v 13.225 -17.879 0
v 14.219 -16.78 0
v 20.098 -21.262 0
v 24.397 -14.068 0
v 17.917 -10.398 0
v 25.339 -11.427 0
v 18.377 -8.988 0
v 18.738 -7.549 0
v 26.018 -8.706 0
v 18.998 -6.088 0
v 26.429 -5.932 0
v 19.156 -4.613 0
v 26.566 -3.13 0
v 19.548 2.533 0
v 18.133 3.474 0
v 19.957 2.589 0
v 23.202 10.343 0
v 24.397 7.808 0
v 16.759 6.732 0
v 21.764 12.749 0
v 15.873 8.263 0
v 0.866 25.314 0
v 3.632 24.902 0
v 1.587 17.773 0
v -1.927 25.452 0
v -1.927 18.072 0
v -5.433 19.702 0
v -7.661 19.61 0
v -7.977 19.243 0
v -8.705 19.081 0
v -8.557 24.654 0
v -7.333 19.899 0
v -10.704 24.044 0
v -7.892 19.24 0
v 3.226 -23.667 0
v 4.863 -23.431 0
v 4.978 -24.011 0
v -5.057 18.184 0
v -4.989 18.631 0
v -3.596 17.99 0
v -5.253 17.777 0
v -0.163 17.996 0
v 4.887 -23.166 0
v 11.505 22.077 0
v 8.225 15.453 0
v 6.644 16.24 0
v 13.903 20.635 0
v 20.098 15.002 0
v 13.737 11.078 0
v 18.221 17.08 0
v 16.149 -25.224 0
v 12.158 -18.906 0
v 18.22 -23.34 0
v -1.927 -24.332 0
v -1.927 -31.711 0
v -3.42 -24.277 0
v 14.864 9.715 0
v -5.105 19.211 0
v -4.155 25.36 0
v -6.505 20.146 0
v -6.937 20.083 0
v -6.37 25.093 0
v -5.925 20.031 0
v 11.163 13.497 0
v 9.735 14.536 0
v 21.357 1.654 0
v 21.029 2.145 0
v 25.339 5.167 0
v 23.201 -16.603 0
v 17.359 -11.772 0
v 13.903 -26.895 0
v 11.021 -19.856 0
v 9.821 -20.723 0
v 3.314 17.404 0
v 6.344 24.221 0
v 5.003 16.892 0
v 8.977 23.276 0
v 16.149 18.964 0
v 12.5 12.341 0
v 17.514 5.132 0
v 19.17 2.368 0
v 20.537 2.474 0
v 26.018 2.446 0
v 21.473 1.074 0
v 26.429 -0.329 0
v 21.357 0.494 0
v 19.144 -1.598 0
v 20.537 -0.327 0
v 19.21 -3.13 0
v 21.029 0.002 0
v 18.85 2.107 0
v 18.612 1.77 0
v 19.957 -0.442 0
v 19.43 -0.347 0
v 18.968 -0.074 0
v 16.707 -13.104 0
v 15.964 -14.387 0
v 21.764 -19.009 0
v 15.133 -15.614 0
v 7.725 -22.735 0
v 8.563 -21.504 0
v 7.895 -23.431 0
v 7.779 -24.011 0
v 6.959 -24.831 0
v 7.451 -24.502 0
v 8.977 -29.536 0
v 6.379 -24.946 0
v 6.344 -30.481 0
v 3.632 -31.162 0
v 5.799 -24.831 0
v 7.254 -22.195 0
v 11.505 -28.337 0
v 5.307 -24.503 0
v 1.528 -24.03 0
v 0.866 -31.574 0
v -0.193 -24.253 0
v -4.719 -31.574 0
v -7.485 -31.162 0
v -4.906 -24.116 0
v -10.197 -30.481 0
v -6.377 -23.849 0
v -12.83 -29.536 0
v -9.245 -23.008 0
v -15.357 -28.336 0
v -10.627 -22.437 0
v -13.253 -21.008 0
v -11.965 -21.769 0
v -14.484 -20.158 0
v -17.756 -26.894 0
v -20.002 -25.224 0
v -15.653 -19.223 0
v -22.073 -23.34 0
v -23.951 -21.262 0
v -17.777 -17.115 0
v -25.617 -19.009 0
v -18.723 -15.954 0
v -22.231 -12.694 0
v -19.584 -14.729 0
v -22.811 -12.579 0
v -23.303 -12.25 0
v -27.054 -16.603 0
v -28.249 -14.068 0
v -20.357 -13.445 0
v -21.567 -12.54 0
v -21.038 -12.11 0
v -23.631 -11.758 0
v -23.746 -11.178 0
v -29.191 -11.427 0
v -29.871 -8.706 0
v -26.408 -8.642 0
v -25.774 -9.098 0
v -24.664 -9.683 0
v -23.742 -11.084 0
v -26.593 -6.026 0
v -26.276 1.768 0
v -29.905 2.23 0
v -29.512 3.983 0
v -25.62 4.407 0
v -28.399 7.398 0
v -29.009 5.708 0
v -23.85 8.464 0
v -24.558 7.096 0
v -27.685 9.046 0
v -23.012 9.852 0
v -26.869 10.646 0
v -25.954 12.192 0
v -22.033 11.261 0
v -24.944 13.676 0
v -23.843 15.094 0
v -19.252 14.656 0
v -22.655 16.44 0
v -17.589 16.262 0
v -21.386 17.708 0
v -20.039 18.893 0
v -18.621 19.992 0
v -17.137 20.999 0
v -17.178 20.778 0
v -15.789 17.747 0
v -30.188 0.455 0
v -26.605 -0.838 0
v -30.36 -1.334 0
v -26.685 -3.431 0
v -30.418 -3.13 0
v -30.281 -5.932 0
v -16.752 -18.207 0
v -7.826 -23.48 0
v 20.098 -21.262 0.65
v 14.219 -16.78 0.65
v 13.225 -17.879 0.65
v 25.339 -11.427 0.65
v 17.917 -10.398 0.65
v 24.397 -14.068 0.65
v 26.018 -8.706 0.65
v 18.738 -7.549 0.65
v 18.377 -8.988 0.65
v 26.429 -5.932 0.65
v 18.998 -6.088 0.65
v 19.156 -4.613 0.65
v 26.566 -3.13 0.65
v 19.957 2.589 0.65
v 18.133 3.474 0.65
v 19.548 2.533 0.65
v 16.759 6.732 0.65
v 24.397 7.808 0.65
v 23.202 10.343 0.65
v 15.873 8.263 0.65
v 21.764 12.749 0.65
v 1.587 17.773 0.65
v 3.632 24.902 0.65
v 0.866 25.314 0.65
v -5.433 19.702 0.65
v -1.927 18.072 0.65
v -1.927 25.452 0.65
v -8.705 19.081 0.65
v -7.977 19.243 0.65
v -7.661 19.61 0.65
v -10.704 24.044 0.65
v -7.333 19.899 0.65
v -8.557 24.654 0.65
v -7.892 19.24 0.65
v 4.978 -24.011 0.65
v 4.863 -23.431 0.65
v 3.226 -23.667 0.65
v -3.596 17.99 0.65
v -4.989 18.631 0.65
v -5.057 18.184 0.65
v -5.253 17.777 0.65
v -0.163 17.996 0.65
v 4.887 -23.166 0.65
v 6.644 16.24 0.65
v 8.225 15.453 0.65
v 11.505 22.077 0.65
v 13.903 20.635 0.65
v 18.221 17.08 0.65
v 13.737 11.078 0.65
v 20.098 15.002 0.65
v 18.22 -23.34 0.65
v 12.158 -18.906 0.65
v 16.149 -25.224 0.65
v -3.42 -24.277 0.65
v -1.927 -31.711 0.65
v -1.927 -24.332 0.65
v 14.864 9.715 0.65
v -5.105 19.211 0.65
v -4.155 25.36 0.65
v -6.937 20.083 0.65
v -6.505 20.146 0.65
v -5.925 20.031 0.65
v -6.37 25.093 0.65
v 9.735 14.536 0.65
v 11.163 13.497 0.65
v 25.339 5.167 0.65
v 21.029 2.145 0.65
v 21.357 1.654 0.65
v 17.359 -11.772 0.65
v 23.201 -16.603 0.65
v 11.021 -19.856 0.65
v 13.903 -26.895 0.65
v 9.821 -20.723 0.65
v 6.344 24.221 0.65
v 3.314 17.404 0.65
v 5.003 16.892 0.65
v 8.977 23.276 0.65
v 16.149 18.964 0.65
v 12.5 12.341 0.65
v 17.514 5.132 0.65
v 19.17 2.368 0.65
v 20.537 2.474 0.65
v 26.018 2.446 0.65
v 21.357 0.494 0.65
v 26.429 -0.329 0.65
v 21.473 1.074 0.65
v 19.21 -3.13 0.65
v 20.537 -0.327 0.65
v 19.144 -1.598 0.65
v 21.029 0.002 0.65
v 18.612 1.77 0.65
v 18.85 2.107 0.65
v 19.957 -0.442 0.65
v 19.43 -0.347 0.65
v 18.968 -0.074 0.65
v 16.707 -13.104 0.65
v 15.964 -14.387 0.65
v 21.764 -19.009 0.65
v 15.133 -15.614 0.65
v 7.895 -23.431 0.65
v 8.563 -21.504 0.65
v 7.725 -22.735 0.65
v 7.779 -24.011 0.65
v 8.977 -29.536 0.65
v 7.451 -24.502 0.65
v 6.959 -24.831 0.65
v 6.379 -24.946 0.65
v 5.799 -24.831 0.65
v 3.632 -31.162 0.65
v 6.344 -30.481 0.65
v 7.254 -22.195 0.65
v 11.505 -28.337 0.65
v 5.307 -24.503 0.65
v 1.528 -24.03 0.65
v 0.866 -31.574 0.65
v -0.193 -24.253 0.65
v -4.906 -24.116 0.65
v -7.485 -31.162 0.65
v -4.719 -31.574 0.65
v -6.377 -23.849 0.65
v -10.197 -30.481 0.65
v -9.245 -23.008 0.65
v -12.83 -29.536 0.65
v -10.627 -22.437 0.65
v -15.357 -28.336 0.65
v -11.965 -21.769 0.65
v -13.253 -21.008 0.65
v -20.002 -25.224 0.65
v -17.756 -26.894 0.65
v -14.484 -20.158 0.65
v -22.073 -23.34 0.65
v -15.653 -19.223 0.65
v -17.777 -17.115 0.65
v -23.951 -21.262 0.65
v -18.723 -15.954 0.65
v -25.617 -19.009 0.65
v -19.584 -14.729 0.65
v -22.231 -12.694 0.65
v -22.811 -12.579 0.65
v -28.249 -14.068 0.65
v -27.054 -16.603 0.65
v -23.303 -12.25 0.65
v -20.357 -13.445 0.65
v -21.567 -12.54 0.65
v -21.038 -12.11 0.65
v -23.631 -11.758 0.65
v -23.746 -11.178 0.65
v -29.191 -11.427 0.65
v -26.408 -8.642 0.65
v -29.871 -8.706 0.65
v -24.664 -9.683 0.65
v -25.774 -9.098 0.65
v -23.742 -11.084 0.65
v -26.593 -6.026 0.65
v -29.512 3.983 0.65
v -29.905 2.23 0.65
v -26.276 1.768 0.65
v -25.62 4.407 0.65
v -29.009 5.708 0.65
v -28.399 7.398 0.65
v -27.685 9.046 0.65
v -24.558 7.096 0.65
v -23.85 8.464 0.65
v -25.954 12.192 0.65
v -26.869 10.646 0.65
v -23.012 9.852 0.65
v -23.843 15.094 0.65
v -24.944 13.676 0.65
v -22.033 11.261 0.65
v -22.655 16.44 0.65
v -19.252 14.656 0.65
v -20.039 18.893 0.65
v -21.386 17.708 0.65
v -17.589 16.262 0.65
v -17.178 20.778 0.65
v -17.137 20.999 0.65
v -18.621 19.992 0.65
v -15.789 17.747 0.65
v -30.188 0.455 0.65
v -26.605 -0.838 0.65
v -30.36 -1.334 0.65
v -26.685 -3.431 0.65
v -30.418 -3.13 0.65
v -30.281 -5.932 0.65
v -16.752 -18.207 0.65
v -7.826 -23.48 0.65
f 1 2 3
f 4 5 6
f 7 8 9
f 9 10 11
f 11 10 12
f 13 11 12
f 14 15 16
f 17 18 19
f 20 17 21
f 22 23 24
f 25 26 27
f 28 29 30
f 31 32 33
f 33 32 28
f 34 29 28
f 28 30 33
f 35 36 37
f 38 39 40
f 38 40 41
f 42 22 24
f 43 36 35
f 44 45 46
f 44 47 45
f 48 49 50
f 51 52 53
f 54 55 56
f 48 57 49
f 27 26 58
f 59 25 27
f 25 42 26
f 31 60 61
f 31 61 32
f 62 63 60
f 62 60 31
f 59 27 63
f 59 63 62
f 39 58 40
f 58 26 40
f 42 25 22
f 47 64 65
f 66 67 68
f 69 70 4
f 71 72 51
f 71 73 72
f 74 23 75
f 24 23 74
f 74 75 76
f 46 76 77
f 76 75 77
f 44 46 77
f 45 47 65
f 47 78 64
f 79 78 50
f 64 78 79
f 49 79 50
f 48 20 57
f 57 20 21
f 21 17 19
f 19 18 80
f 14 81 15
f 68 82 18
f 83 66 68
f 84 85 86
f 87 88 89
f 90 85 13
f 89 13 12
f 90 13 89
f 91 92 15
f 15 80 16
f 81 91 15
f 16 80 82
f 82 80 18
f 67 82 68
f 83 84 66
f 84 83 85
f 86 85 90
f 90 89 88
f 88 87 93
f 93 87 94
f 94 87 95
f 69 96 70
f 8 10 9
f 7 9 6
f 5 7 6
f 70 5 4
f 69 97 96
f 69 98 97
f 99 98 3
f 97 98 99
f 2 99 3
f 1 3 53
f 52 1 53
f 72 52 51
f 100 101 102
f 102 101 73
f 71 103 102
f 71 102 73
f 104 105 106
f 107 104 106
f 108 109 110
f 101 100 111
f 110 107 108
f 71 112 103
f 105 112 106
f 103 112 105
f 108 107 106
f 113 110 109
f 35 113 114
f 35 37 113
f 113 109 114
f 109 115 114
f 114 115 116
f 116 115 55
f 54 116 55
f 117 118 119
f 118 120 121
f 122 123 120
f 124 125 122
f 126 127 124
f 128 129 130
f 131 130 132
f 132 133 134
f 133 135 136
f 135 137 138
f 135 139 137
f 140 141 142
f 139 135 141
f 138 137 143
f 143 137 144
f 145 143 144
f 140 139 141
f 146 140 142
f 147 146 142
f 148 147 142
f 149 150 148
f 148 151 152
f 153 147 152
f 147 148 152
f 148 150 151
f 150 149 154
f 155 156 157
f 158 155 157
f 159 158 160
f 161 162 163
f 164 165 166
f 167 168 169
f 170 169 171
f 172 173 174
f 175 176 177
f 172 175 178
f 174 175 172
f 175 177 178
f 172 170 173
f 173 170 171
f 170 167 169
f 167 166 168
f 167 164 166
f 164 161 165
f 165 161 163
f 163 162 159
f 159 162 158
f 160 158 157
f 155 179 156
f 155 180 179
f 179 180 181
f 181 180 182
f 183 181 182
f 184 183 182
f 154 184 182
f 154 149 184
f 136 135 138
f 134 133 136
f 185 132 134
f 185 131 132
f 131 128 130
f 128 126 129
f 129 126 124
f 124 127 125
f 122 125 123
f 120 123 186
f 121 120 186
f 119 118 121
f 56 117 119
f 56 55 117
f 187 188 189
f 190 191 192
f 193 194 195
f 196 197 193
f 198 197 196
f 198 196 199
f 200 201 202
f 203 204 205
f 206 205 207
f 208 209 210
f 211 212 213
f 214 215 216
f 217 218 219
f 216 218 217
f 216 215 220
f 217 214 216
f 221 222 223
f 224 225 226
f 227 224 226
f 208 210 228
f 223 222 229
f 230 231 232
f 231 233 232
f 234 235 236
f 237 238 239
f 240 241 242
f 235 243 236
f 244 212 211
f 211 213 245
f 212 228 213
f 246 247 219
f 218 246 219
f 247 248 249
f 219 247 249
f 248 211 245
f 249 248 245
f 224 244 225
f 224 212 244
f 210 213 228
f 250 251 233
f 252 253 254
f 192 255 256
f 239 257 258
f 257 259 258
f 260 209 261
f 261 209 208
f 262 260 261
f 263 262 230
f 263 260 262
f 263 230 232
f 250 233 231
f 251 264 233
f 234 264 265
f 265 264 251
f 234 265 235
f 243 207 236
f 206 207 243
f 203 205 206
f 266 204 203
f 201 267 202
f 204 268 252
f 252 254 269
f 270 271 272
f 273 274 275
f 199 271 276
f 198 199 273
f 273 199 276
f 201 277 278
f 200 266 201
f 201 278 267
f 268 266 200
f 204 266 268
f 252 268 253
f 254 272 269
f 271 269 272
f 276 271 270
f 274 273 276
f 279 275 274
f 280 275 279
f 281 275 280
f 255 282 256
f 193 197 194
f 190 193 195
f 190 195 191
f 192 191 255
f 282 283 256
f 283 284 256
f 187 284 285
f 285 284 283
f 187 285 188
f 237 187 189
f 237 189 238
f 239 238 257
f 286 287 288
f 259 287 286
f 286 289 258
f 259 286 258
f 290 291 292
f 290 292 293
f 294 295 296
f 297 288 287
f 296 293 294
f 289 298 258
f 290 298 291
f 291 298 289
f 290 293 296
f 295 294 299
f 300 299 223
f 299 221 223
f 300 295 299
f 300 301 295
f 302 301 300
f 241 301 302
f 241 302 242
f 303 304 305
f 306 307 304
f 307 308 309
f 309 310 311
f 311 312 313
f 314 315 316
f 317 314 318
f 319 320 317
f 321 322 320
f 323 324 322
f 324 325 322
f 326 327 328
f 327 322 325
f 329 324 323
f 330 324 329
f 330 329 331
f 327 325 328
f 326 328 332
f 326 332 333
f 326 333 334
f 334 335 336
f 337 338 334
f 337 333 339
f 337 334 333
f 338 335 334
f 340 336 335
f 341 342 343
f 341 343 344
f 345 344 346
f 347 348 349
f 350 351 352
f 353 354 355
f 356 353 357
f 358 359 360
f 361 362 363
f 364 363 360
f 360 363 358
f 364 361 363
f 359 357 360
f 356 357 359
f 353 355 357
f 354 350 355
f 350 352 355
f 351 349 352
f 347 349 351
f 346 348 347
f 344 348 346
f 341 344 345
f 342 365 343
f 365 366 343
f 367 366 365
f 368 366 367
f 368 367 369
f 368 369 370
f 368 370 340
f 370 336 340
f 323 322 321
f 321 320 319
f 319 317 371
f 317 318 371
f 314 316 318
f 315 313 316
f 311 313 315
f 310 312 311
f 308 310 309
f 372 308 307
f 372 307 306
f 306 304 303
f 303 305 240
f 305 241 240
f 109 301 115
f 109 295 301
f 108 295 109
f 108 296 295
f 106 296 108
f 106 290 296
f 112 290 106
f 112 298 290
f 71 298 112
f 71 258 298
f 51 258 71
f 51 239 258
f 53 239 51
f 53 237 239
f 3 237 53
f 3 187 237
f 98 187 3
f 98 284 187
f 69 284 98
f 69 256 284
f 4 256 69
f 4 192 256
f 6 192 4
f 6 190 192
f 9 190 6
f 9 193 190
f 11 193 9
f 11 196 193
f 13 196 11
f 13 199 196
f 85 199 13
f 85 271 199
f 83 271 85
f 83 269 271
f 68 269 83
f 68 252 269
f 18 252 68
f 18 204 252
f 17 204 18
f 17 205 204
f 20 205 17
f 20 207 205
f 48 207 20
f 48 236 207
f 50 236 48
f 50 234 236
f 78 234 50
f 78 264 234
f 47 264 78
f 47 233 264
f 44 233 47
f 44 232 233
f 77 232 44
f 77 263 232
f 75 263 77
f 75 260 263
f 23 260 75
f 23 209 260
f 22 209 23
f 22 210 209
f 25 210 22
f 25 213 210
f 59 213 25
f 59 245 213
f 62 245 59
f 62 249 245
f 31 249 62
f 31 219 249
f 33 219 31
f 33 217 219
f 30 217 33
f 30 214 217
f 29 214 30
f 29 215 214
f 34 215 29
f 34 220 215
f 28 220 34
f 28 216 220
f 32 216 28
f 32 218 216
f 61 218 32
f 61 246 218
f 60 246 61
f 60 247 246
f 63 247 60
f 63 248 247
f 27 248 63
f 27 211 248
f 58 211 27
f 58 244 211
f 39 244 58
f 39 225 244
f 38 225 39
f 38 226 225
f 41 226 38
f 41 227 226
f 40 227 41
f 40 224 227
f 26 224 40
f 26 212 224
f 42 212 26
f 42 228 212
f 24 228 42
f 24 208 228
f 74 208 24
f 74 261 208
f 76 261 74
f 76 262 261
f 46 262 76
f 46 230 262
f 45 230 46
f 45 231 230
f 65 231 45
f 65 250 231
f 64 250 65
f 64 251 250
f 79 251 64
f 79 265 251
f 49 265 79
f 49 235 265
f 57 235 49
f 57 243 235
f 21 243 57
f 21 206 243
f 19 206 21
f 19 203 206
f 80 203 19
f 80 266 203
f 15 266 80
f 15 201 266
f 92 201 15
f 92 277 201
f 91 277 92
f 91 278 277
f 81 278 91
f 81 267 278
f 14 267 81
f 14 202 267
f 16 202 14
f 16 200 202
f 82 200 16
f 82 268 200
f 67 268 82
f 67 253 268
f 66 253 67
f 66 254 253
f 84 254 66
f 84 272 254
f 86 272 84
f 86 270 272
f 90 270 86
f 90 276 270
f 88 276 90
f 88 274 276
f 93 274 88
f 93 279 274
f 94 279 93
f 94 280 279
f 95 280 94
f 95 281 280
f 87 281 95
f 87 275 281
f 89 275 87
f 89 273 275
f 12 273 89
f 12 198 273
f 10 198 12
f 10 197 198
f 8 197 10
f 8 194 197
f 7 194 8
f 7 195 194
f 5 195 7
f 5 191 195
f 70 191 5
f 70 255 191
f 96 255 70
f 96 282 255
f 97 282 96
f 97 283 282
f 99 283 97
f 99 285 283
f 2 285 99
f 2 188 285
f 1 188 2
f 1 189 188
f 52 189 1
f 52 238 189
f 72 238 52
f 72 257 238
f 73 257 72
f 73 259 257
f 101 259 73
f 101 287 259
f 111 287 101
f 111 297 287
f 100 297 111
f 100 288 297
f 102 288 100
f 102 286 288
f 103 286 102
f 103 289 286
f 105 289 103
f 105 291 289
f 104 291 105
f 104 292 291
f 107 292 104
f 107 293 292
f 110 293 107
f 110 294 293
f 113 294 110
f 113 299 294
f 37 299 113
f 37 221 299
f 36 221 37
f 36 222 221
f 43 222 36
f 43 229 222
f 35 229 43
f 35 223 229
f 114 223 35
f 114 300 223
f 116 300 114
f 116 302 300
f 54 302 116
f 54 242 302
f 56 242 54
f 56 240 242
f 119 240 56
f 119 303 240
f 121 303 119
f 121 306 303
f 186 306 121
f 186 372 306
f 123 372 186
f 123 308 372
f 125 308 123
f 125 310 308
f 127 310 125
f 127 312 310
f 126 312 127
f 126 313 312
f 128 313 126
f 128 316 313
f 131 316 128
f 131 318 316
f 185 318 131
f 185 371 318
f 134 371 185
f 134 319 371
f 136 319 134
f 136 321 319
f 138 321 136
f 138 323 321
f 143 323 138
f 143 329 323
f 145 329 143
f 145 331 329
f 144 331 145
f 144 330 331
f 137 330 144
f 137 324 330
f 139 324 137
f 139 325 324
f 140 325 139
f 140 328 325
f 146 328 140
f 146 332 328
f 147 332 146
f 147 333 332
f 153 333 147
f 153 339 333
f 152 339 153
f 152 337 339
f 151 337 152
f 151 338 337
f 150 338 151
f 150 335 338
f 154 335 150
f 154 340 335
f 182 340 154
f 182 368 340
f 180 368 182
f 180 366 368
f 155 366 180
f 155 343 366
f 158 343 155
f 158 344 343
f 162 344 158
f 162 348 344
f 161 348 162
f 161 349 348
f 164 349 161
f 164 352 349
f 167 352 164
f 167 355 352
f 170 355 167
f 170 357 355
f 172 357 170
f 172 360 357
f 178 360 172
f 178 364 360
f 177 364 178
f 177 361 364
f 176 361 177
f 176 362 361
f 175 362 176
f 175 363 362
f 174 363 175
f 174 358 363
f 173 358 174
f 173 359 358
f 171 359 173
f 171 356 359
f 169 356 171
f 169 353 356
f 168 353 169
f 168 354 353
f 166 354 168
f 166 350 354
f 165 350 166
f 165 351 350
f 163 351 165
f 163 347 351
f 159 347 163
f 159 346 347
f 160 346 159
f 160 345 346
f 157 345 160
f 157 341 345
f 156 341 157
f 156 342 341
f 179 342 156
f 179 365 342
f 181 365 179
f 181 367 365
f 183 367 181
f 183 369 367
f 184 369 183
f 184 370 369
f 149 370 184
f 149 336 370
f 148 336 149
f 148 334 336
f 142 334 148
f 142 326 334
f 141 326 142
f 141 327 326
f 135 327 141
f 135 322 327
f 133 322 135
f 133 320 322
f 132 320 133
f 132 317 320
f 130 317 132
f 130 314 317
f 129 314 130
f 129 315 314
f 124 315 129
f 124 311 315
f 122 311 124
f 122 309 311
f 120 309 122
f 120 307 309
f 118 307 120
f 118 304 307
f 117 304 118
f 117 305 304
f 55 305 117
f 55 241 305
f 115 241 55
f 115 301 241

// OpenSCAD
height_ship = 0.65;

center_ship_1 = [-1.926290986,-3.129920167];
size_ship_1 = [56.984115807,57.162917324];
stroke_width_ship_1 = 0.263352320;
// paths for ship_1
points_ship_1_1 = [ [-0.000259292,28.581458662],[-2.229081249,28.489718778],[-4.443917753,28.223348693],[-6.631192720,27.783981150],[-8.777499009,27.174309302],[-6.778656628,22.210787020],[-6.051052474,22.373053326],[-5.965785205,22.369433827],[-5.734531606,22.739999746],[-5.407204891,23.029230714],[-5.010989030,23.213106554],[-4.578789126,23.276356665],[-3.998776227,23.160967826],[-3.507065558,22.832410129],[-3.178508712,22.340698897],[-3.063120882,21.760685809],[-3.130488922,21.313709606],[-3.326669690,20.906475906],[-1.669293112,21.120274157],[-0.000259292,21.202063102],[1.762986824,21.126052251],[3.513764304,20.902741144],[5.239866050,20.533686790],[6.929257012,20.021462381],[8.570158102,19.369639342],[10.151128324,18.582762438],[11.661144539,17.666318077],[13.089678331,16.626696066],[14.426769409,15.471145051],[15.663095056,14.207721981],[16.790035130,12.845235932],[17.799732170,11.393186683],[18.685146177,9.861698484],[19.440103701,8.261449464],[20.059340886,6.603597178],[20.538540172,4.899700815],[20.776208444,5.237062548],[21.096063470,5.497815134],[21.474395622,5.662629979],[21.883160585,5.719289991],[22.463173484,5.603901151],[22.954884153,5.275343454],[23.283440999,4.783632222],[23.398828828,4.203619134],[23.283440999,3.623606047],[22.954884153,3.131894815],[22.463173484,2.803337118],[21.883160585,2.687948278],[21.355836107,2.783147757],[20.894589957,3.055885784],[21.070391508,1.532195153],[21.135919057,-0.000257969],[21.081848921,-1.482990197],[20.924537848,-2.958298516],[20.664756212,-4.418958141],[20.303776199,-5.857816026],[19.843365576,-7.267825888],[19.285779036,-8.642082720],[18.633747156,-9.973856600],[17.890463024,-11.256625651],[17.059566603,-12.484107981],[16.145126904,-13.650292443],[15.151622063,-14.749468073],[14.083917406,-15.776252061],[12.947241627,-16.725616107],[11.747161182,-17.592911048],[10.489553025,-18.373889621],[9.180575835,-19.064727271],[9.651011404,-19.604924644],[9.820846323,-20.300826159],[9.705458493,-20.880839246],[9.376901648,-21.372550479],[8.885190978,-21.701108176],[8.305178080,-21.816497015],[7.725005929,-21.701257039],[7.233119266,-21.372733855],[6.904428683,-20.880959042],[6.788991253,-20.300826159],[6.813795940,-20.035726899],[5.151931098,-20.537338513],[3.454644645,-20.900492096],[1.733379616,-21.122739280],[-0.000259292,-21.202581686],[-1.493968051,-21.147042644],[-2.980028583,-20.985742790],[-4.451008659,-20.719488830],[-5.899551476,-20.349612380],[-7.318412443,-19.877963300],[-8.700495419,-19.306900447],[-10.038888199,-18.639279874],[-11.326897088,-17.878440549],[-12.558080372,-17.028187652],[-13.726280542,-16.092773550],[-14.825655083,-15.076876524],[-15.850705701,-13.985577375],[-16.796305815,-12.824334010],[-17.657726200,-11.598954151],[-18.430658639,-10.315566283],[-19.111237468,-8.980589006],[-19.640460540,-9.410243557],[-20.304444780,-9.564532337],[-20.884577676,-9.449094910],[-21.376352499,-9.120404334],[-21.704875691,-8.628517681],[-21.820115669,-8.048345544],[-21.815464295,-7.953778172],[-22.737370507,-6.553346582],[-23.848182602,-5.968467288],[-24.481450892,-5.512584270],[-24.481450892,-5.512584270],[-24.666637301,-2.896028690],[-24.758557033,-0.300607293],[-24.679110731,2.291465534],[-24.350199041,4.897975401],[-23.693722606,7.536707920],[-22.631582072,10.225448703],[-21.923981719,11.594130197],[-21.085678083,12.981983361],[-20.106908744,14.391231396],[-17.326025165,17.785854354],[-15.662319366,19.392361461],[-13.862462500,20.876503907],[-15.252040913,23.907842974],[-15.210699768,24.128500173],[-16.694843258,23.121715417],[-18.112972878,22.023348963],[-19.459481138,20.837743911],[-20.729043744,19.569588319],[-21.916640660,18.223896659],[-23.017575955,16.805989993],[-24.027496368,15.321474933],[-24.942408526,13.776221469],[-25.758694732,12.176339760],[-26.473127271,10.528155972],[-27.082881172,8.838187266],[-27.585545378,7.113116026],[-27.979132281,5.359763437],[-28.262085582,3.585062512],[-28.433286440,1.796030678],[-28.492057903,-0.000257969],[-28.354844064,-2.801693768],[-27.944563256,-5.576148861],[-27.265166622,-8.296904313],[-26.323196980,-10.937758332],[-25.127725814,-13.473278607],[-23.690265915,-15.879047224],[-22.024660504,-18.131895821],[-20.146949922,-20.210128709],[-18.075217154,-22.093731806],[-15.829413683,-23.764565380],[-13.431167352,-25.206538742],[-10.903574081,-26.405765204],[-8.270975443,-27.350695810],[-5.558724248,-28.032230561],[-2.792940388,-28.443806049],[-0.000259292,-28.581458662],[2.792456557,-28.443853851],[5.558279206,-28.032319362],[8.270572236,-27.350818504],[10.903214749,-26.405914509],[13.430852924,-25.206707334],[15.829144191,-23.764746012],[18.074991663,-22.093917440],[20.146766574,-20.210312630],[22.024516572,-18.132071751],[23.690157873,-15.879209425],[25.127649420,-13.473421977],[26.323147366,-10.937878485],[27.265138395,-8.296997652],[27.944550609,-5.576212638],[28.354840887,-2.801726124],[28.492057903,-0.000257969],[28.354888149,2.801244762],[27.944638407,5.575769867],[27.265259703,8.296596504],[26.323294984,10.937520987],[25.127816106,13.473109154],[23.690336464,15.878941309],[22.024700108,18.131847413],[20.146948417,20.210130220],[18.075165605,22.093774244],[15.829304559,23.764638524],[13.430994673,25.206631331],[10.903333543,26.405865150],[8.270664520,27.350790423],[5.558342261,28.032306781],[2.792488547,28.443850691],[-0.000259292,28.581458662] ];

module polygon_ship_1() {
 render(convexity=4) {
    polygon(points=points_ship_1_1);
 }
}

linear_extrude(height=height_ship) translate(center_ship_1) polygon_ship_1();
